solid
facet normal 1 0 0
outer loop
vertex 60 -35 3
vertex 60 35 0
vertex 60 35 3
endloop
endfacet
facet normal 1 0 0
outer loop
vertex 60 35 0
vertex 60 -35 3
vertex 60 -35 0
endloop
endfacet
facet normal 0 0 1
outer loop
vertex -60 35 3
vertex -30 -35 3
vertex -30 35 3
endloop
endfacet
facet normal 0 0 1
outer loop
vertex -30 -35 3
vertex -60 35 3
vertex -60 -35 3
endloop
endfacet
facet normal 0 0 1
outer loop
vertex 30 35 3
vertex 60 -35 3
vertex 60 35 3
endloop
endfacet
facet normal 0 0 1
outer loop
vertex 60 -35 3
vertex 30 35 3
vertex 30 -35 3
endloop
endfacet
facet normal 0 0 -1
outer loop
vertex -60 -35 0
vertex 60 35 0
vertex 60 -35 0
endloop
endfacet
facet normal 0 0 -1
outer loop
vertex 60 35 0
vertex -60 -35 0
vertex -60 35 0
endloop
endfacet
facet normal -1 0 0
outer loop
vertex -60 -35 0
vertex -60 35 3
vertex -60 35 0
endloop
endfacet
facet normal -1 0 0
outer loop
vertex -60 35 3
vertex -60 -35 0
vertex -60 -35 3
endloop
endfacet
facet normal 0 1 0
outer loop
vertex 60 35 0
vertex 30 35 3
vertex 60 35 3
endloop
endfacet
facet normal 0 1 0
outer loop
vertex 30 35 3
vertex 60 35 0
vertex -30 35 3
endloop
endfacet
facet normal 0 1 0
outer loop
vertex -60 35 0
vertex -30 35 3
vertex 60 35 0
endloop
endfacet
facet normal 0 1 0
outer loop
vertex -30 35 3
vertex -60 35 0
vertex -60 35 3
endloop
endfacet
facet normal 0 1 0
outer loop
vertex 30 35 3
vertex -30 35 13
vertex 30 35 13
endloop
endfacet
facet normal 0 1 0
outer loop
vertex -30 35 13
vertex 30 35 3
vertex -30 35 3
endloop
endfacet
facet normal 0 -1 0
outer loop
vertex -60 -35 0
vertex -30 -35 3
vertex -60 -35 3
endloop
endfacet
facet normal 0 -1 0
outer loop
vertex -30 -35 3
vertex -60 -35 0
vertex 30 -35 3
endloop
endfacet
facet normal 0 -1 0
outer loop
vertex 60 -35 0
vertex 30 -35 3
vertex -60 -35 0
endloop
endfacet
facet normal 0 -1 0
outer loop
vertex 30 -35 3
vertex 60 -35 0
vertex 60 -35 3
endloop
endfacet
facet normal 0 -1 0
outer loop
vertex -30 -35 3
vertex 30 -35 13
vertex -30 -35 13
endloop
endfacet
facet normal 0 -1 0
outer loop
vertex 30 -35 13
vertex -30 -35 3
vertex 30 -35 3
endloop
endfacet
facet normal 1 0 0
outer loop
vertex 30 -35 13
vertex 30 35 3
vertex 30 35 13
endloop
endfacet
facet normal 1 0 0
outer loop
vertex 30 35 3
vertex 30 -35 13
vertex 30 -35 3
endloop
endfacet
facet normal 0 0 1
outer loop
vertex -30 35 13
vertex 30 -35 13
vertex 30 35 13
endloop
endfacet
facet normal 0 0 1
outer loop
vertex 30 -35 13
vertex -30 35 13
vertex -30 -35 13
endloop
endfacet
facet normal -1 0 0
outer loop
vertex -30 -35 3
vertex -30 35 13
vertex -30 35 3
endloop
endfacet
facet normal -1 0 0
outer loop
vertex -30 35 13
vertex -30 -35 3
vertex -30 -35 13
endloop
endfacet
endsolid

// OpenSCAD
// Mini horizontal gel-electrophoresis buffer tank
// Print orientation: base on XY plane, open top at z = 40

// ---------- Parameters ----------
outer_x   = 120;   // tank outer length (X)
outer_y   = 70;    // tank outer width (Y)
height    = 40;    // tank overall height (Z)
wall      = 3;     // wall thickness
floor     = 3;     // floor thickness under chambers

platform_len = 60;   // platform length in X
platform_top_z = 13; // top of platform (above inner floor)

hole_d     = 2;    // electrode hole diameter
hole_y     = 0;    // hole Y position
hole_z     = 30;   // hole Z position

eps        = 0.5;  // cutter overshoot
$fn        = 64;

// ---------- Derived ----------
inner_h = height - wall;              // 37 mm chamber height
overlap = min(wall, floor);           // walls merge into floor

// ---------- Model ----------
difference() {
    union() {
        // Base slab (floor + end walls, includes overlap)
        translate([-outer_x/2, -outer_y/2, 0])
            cube([outer_x, outer_y, overlap]);

        // Raised platform
        translate([-platform_len/2, -outer_y/2, floor])
            cube([platform_len, outer_y, platform_top_z - floor]);
    }

    // Buffer chambers (open at top, above platform)
    translate([-outer_x/2, -outer_y/2, platform_top_z])
        cube([outer_x, outer_y, height - platform_top_z]);

    // Electrode holes through end walls
    for (sx = [-1, 1])
        translate([sx > 0 ? outer_x/2 - eps : -outer_x/2, hole_y, hole_z])
            rotate([0, 90, 0])
                cylinder(d = hole_d, h = outer_y + 2*eps);
}
